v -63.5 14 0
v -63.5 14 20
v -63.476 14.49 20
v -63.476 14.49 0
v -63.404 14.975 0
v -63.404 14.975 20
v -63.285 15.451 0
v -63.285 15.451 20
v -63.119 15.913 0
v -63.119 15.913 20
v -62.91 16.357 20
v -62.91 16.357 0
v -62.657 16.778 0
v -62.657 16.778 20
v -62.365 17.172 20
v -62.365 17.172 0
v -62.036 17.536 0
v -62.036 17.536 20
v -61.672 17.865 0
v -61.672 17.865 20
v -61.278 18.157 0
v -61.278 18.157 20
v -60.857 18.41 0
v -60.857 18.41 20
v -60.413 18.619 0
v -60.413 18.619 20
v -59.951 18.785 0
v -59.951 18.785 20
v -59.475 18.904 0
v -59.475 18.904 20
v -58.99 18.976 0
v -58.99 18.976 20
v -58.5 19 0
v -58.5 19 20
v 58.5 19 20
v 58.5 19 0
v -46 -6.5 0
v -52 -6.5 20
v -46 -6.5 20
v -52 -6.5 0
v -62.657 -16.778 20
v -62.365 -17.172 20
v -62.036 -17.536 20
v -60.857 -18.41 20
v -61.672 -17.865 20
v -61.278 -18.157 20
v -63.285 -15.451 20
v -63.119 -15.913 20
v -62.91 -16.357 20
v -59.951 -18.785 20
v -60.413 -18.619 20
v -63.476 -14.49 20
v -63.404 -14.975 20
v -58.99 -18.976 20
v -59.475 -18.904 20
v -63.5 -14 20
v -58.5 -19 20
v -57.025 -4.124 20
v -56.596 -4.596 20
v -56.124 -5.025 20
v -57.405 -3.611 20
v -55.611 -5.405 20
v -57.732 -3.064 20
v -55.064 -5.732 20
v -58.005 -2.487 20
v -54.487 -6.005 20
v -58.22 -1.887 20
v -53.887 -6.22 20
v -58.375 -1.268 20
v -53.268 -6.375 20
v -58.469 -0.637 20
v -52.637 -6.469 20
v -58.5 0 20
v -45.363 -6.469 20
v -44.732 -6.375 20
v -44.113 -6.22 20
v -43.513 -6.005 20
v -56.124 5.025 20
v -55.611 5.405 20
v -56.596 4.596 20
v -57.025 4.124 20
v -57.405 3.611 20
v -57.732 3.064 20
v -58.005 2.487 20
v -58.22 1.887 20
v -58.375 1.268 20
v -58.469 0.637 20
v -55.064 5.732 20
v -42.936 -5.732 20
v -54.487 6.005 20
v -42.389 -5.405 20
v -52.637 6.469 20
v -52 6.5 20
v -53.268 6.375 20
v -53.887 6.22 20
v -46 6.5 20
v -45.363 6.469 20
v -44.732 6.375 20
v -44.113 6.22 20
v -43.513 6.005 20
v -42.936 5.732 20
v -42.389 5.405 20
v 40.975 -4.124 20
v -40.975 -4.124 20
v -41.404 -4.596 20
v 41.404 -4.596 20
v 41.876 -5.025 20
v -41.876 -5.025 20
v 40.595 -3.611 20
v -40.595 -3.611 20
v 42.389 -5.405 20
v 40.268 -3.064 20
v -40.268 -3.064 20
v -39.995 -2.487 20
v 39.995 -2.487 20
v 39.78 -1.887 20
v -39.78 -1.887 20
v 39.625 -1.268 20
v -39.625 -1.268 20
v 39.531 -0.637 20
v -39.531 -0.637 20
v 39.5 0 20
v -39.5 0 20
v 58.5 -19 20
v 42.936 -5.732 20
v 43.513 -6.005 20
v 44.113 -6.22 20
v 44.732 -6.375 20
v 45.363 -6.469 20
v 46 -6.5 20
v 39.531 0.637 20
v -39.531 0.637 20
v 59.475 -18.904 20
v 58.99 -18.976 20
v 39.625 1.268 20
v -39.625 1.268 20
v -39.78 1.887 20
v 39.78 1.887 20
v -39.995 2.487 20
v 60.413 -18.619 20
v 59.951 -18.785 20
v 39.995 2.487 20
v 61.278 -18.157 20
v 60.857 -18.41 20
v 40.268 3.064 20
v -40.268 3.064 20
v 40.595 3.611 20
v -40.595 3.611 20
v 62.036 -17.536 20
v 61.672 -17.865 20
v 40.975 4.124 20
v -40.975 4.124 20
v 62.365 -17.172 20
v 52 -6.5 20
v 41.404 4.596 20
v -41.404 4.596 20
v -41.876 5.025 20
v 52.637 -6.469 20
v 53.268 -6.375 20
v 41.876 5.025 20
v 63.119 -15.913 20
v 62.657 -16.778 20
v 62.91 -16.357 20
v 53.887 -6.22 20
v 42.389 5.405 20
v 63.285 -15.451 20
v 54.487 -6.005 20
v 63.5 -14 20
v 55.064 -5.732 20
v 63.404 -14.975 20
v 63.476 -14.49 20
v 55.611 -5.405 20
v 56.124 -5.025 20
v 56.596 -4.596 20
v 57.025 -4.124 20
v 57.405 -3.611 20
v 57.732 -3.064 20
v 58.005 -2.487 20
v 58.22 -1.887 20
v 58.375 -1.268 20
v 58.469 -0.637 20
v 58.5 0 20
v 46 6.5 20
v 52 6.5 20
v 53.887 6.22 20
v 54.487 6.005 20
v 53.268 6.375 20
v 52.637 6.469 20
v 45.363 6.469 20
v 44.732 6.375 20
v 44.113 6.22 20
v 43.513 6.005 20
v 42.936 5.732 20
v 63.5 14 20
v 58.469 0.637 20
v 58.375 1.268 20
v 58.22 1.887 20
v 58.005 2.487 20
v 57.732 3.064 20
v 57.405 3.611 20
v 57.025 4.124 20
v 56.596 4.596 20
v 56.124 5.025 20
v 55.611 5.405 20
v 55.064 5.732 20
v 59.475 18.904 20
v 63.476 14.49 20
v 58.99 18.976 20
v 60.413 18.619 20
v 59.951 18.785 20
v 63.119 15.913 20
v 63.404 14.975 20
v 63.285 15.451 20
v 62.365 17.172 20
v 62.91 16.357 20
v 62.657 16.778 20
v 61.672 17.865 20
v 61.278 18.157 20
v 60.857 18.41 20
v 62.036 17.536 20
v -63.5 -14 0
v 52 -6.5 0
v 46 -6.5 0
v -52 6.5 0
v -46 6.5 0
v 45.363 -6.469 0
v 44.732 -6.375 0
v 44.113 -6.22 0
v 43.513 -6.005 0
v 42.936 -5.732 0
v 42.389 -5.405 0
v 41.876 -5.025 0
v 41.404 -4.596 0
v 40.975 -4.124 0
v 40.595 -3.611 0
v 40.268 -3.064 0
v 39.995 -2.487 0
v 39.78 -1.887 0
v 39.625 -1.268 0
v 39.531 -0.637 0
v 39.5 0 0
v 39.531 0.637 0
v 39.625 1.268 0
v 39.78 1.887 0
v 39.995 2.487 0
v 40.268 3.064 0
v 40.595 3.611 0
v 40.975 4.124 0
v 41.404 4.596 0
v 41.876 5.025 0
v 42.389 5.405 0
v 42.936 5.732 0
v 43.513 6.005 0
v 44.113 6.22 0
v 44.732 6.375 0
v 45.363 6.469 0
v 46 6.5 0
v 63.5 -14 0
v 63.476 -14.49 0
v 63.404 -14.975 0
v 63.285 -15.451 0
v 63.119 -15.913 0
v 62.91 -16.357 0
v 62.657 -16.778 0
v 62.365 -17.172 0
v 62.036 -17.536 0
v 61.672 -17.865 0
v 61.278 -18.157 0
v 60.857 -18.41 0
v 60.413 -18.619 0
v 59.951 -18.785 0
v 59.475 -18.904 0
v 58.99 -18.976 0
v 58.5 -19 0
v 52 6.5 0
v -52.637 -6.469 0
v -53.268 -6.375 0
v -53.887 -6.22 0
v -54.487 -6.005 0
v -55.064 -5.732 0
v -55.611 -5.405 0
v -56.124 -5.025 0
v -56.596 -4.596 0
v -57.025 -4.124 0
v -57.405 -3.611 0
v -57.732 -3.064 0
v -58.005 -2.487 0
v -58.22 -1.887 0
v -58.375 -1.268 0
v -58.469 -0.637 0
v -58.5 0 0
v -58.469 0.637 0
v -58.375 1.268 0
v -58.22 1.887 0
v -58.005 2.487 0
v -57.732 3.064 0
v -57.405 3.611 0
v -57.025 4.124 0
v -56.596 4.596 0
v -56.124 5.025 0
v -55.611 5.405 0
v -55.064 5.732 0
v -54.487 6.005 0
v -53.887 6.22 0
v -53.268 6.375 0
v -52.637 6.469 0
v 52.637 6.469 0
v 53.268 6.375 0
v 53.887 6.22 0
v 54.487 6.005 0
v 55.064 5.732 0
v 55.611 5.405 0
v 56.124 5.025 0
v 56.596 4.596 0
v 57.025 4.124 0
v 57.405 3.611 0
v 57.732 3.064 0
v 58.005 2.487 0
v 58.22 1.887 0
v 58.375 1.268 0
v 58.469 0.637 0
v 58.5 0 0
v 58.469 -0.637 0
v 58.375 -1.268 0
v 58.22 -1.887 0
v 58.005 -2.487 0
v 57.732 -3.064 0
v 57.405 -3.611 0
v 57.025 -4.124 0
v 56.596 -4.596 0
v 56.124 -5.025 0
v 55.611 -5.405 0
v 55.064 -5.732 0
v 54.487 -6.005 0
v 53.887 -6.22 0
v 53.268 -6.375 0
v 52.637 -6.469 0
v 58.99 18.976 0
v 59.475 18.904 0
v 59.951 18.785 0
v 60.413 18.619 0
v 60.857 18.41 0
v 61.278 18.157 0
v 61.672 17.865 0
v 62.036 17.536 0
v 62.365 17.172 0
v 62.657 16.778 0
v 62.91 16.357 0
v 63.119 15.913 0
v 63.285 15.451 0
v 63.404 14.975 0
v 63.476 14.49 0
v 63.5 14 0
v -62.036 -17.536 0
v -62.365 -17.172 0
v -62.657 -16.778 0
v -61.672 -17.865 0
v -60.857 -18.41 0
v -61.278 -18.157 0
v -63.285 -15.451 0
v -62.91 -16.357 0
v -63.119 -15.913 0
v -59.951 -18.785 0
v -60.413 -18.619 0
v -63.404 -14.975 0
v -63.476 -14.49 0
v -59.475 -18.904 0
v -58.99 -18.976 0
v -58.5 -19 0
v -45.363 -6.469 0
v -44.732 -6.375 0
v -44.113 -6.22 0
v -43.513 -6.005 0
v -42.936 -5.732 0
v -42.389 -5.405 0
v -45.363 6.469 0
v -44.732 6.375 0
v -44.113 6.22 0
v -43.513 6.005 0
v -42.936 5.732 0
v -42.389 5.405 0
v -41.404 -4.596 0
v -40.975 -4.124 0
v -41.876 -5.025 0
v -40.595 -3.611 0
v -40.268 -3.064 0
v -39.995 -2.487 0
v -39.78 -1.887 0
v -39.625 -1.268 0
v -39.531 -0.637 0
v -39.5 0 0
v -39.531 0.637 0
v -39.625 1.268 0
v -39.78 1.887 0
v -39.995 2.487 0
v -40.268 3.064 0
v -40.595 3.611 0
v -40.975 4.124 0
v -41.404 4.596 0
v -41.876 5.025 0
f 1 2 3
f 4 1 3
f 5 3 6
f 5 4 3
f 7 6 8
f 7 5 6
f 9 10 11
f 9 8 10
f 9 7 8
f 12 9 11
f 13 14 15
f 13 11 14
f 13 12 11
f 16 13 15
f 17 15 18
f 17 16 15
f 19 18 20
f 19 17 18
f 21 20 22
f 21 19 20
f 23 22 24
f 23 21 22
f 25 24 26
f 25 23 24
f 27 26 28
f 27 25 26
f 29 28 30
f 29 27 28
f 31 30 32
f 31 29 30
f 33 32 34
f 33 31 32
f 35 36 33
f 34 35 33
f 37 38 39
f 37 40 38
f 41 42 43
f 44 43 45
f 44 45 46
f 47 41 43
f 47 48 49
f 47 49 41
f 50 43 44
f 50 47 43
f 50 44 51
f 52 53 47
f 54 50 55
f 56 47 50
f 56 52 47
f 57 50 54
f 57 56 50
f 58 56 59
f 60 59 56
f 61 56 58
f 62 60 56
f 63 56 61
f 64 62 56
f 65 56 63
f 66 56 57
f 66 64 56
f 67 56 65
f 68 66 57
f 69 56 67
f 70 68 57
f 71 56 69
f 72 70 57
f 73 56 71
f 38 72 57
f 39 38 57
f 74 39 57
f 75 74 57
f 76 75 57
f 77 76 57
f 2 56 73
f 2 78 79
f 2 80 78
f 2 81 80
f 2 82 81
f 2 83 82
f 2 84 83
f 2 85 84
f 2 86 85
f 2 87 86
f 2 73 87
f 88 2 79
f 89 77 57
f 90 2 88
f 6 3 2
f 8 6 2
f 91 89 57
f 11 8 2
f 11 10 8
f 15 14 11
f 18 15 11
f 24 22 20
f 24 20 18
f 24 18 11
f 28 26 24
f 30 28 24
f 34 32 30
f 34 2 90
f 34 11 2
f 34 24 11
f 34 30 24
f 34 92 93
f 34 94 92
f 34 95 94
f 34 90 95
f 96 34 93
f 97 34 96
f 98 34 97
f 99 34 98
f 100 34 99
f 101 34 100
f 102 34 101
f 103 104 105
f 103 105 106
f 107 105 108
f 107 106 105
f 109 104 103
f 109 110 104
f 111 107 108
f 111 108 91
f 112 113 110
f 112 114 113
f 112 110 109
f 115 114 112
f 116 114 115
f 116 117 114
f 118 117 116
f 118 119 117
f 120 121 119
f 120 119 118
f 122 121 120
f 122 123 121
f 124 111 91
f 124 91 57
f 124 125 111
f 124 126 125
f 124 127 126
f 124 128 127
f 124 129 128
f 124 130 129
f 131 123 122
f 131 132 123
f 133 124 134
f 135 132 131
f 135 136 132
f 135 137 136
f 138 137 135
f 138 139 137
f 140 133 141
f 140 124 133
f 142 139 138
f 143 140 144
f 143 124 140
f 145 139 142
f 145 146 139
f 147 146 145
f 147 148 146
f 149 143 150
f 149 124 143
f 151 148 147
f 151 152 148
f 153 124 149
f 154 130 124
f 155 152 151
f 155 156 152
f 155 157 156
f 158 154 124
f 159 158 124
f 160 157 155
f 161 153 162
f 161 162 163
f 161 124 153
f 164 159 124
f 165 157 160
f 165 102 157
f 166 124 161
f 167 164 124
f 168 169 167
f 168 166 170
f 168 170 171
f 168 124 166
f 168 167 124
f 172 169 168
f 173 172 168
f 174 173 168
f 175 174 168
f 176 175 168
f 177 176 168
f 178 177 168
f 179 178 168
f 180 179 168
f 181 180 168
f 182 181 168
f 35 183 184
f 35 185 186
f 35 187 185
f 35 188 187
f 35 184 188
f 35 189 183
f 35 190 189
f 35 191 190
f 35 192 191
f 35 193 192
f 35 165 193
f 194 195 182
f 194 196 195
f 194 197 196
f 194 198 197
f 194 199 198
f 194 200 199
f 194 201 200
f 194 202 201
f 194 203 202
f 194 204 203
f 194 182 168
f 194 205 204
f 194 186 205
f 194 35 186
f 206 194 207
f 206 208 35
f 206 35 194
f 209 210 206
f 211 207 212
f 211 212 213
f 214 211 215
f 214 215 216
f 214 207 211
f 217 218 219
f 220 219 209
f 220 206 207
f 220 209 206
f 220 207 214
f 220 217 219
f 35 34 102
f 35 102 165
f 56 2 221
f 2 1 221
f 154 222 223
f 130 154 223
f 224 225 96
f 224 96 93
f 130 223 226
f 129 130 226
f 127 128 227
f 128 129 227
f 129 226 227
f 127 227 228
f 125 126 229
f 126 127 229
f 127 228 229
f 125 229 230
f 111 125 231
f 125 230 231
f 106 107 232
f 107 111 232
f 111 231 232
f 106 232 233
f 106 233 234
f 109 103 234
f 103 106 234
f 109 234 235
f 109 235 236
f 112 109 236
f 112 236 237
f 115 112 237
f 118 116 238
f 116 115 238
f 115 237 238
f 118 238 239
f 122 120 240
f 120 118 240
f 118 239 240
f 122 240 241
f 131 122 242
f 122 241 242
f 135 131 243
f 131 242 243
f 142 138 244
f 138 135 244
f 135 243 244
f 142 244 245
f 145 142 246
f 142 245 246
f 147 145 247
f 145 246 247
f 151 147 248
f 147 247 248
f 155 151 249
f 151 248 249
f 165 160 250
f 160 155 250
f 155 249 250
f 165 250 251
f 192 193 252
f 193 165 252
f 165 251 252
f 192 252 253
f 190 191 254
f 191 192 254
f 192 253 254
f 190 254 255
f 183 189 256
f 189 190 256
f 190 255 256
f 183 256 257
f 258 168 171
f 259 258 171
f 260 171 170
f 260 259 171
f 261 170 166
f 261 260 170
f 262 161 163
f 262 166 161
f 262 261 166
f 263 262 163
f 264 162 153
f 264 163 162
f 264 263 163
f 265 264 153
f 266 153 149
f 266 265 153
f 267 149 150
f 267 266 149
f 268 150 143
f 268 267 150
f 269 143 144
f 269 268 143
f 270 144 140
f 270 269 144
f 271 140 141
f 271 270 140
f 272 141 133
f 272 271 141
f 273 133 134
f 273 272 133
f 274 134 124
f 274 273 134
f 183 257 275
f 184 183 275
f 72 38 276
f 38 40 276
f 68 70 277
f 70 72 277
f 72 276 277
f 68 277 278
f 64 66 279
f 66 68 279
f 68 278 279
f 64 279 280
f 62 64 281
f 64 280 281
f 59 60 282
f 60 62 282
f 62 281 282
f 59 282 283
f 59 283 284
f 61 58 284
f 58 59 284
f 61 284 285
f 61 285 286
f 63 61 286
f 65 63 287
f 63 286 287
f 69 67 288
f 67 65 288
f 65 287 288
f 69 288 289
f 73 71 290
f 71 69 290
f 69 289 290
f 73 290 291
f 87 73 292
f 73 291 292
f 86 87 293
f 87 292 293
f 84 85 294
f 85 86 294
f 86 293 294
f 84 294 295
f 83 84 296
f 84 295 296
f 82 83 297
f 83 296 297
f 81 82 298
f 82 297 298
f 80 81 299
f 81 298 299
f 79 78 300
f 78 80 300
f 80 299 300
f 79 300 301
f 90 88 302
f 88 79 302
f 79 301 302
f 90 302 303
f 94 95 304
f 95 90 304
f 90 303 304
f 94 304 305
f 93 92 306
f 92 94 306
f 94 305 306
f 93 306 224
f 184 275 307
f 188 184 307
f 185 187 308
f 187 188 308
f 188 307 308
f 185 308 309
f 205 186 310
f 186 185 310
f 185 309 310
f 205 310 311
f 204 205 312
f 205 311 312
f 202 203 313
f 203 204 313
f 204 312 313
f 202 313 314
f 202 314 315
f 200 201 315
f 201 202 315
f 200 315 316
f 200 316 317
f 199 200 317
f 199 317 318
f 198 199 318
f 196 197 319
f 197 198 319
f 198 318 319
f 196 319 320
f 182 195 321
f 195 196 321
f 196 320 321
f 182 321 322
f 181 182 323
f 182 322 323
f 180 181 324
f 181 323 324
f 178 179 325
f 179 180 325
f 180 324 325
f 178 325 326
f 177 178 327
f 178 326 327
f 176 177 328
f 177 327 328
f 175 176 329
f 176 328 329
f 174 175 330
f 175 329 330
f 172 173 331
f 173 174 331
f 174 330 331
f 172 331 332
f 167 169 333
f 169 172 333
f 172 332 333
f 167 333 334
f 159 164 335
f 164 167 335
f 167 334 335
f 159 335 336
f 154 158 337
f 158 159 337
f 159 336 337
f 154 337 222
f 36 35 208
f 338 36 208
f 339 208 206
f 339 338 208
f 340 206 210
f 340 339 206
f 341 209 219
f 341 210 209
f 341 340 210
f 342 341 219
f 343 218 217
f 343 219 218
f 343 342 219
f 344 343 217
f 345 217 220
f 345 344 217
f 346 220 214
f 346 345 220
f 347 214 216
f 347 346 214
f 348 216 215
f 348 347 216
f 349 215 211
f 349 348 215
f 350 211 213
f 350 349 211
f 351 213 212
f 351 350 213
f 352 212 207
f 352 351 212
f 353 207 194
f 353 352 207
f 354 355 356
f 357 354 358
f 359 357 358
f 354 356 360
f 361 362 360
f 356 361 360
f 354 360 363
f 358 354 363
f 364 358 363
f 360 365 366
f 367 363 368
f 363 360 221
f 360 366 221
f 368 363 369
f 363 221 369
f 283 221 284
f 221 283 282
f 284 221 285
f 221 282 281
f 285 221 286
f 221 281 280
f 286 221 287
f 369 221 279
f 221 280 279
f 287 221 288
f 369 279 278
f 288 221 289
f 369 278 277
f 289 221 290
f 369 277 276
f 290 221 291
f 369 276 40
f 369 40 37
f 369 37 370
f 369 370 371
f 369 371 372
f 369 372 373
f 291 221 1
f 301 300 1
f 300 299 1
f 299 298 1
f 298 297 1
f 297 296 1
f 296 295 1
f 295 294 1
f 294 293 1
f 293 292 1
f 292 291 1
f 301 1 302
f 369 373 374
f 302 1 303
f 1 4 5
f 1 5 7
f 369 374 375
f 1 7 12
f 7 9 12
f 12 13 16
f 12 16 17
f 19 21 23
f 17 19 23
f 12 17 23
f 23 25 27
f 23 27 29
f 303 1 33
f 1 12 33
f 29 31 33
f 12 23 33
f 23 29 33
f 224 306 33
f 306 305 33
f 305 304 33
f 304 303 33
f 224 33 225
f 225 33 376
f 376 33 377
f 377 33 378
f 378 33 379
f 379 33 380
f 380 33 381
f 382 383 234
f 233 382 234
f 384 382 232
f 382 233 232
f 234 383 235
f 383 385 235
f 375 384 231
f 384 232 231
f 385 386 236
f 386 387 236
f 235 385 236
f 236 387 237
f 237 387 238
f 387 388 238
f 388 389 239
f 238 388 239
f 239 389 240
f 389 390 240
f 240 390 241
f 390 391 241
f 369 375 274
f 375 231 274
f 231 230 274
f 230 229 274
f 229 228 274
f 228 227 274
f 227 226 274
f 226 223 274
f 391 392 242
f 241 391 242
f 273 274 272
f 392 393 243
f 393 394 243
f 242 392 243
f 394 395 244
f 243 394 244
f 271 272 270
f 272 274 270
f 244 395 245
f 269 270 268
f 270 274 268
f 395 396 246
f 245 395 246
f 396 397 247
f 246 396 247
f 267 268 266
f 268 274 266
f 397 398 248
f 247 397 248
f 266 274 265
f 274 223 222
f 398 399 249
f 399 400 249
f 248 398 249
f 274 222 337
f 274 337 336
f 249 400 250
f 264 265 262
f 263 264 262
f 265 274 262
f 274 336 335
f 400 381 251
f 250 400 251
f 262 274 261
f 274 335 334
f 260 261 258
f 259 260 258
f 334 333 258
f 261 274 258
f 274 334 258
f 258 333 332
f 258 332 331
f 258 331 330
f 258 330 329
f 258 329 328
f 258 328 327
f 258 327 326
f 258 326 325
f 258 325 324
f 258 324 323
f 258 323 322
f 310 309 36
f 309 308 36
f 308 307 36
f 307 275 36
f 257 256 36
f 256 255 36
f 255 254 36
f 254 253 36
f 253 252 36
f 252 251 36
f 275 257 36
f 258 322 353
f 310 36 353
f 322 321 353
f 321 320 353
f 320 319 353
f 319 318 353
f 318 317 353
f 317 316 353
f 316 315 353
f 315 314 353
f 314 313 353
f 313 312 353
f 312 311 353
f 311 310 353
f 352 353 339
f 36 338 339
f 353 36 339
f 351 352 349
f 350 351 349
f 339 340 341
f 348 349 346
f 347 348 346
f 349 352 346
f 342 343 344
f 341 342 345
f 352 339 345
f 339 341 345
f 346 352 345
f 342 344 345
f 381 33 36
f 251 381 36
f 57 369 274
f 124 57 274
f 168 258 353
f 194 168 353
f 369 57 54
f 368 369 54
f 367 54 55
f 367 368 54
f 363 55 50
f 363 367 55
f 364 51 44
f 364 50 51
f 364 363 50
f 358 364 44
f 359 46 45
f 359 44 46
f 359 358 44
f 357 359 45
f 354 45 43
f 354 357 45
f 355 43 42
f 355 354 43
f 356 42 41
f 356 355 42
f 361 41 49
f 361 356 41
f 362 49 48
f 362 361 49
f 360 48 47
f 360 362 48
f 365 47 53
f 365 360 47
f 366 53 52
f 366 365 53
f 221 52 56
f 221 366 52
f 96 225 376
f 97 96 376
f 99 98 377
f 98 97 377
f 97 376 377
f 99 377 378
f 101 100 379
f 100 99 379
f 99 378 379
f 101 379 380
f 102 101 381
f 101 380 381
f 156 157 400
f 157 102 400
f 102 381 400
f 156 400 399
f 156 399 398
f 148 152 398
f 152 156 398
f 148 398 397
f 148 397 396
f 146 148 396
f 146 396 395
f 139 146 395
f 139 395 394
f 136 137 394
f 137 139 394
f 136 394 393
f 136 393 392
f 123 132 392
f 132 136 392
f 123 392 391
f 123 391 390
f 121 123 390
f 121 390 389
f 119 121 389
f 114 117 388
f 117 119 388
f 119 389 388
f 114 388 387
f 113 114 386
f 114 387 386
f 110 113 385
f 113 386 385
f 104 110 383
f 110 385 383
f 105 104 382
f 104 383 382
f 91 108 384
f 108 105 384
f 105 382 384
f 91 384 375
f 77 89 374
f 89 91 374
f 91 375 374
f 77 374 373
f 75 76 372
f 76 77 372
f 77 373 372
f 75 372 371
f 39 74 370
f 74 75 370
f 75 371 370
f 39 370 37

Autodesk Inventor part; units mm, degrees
ref_plane "YZ Plane" through (0, 0, 0) normal (1, 0, 0) x (0, 1, 0)
ref_plane "XZ Plane" through (0, 0, 0) normal (0, 1, 0) x (-1, 0, 0)
ref_plane "XY Plane" through (0, 0, 0) normal (0, 0, 1) x (1, 0, 0)
sketch "Boceto1" plane through (0, 0, 0) normal (0, 0, 1) x (1, 0, 0)
  line L0 (-58.5, -19) -> (58.5, -19)
  line L1 (63.5, -14) -> (63.5, 14)
  line L2 (58.5, 19) -> (-58.5, 19)
  line L3 (-63.5, 14) -> (-63.5, -14)
  line L4 (-63.5, -19) -> (63.5, 19) construction
  line L5 (63.5, -19) -> (-63.5, 19) construction
  arc A0 (-58.5, 19) -> (-63.5, 14) centre (-58.5, 14) ccw
  arc A1 (-63.5, -14) -> (-58.5, -19) centre (-58.5, -14) ccw
  arc A2 (58.5, -19) -> (63.5, -14) centre (58.5, -14) ccw
  arc A3 (63.5, 14) -> (58.5, 19) centre (58.5, 14) ccw
  line L6 (-63.5, 0) -> (63.5, 0) construction
  line L7 (-58.5, 0) -> (-39.5, 0) construction
  line L8 (-52, -6.5) -> (-46, -6.5)
  line L9 (-46, 6.5) -> (-52, 6.5)
  arc A4 (-52, 6.5) -> (-52, -6.5) centre (-52, 0) ccw
  arc A5 (-46, -6.5) -> (-46, 6.5) centre (-46, 0) ccw
  line L10 (0, 19) -> (0, -19) construction
  line L11 (52, -6.5) -> (46, -6.5)
  line L12 (46, 6.5) -> (52, 6.5)
  arc A6 (52, -6.5) -> (52, 6.5) centre (52, 0) ccw
  arc A7 (46, 6.5) -> (46, -6.5) centre (46, 0) ccw
  point P0 (0, 0)
  point P1 (-49, 0)
  dimension "d0" = 38
  dimension "d1" = 127
  dimension "d2" = 5
  dimension "d3" = 5
  dimension "d4" = 19
  dimension "d6" = 13
extrude "Extrusión1" add sketch "Boceto1" along normal blind 20
properties part number "SoporteMancal"
